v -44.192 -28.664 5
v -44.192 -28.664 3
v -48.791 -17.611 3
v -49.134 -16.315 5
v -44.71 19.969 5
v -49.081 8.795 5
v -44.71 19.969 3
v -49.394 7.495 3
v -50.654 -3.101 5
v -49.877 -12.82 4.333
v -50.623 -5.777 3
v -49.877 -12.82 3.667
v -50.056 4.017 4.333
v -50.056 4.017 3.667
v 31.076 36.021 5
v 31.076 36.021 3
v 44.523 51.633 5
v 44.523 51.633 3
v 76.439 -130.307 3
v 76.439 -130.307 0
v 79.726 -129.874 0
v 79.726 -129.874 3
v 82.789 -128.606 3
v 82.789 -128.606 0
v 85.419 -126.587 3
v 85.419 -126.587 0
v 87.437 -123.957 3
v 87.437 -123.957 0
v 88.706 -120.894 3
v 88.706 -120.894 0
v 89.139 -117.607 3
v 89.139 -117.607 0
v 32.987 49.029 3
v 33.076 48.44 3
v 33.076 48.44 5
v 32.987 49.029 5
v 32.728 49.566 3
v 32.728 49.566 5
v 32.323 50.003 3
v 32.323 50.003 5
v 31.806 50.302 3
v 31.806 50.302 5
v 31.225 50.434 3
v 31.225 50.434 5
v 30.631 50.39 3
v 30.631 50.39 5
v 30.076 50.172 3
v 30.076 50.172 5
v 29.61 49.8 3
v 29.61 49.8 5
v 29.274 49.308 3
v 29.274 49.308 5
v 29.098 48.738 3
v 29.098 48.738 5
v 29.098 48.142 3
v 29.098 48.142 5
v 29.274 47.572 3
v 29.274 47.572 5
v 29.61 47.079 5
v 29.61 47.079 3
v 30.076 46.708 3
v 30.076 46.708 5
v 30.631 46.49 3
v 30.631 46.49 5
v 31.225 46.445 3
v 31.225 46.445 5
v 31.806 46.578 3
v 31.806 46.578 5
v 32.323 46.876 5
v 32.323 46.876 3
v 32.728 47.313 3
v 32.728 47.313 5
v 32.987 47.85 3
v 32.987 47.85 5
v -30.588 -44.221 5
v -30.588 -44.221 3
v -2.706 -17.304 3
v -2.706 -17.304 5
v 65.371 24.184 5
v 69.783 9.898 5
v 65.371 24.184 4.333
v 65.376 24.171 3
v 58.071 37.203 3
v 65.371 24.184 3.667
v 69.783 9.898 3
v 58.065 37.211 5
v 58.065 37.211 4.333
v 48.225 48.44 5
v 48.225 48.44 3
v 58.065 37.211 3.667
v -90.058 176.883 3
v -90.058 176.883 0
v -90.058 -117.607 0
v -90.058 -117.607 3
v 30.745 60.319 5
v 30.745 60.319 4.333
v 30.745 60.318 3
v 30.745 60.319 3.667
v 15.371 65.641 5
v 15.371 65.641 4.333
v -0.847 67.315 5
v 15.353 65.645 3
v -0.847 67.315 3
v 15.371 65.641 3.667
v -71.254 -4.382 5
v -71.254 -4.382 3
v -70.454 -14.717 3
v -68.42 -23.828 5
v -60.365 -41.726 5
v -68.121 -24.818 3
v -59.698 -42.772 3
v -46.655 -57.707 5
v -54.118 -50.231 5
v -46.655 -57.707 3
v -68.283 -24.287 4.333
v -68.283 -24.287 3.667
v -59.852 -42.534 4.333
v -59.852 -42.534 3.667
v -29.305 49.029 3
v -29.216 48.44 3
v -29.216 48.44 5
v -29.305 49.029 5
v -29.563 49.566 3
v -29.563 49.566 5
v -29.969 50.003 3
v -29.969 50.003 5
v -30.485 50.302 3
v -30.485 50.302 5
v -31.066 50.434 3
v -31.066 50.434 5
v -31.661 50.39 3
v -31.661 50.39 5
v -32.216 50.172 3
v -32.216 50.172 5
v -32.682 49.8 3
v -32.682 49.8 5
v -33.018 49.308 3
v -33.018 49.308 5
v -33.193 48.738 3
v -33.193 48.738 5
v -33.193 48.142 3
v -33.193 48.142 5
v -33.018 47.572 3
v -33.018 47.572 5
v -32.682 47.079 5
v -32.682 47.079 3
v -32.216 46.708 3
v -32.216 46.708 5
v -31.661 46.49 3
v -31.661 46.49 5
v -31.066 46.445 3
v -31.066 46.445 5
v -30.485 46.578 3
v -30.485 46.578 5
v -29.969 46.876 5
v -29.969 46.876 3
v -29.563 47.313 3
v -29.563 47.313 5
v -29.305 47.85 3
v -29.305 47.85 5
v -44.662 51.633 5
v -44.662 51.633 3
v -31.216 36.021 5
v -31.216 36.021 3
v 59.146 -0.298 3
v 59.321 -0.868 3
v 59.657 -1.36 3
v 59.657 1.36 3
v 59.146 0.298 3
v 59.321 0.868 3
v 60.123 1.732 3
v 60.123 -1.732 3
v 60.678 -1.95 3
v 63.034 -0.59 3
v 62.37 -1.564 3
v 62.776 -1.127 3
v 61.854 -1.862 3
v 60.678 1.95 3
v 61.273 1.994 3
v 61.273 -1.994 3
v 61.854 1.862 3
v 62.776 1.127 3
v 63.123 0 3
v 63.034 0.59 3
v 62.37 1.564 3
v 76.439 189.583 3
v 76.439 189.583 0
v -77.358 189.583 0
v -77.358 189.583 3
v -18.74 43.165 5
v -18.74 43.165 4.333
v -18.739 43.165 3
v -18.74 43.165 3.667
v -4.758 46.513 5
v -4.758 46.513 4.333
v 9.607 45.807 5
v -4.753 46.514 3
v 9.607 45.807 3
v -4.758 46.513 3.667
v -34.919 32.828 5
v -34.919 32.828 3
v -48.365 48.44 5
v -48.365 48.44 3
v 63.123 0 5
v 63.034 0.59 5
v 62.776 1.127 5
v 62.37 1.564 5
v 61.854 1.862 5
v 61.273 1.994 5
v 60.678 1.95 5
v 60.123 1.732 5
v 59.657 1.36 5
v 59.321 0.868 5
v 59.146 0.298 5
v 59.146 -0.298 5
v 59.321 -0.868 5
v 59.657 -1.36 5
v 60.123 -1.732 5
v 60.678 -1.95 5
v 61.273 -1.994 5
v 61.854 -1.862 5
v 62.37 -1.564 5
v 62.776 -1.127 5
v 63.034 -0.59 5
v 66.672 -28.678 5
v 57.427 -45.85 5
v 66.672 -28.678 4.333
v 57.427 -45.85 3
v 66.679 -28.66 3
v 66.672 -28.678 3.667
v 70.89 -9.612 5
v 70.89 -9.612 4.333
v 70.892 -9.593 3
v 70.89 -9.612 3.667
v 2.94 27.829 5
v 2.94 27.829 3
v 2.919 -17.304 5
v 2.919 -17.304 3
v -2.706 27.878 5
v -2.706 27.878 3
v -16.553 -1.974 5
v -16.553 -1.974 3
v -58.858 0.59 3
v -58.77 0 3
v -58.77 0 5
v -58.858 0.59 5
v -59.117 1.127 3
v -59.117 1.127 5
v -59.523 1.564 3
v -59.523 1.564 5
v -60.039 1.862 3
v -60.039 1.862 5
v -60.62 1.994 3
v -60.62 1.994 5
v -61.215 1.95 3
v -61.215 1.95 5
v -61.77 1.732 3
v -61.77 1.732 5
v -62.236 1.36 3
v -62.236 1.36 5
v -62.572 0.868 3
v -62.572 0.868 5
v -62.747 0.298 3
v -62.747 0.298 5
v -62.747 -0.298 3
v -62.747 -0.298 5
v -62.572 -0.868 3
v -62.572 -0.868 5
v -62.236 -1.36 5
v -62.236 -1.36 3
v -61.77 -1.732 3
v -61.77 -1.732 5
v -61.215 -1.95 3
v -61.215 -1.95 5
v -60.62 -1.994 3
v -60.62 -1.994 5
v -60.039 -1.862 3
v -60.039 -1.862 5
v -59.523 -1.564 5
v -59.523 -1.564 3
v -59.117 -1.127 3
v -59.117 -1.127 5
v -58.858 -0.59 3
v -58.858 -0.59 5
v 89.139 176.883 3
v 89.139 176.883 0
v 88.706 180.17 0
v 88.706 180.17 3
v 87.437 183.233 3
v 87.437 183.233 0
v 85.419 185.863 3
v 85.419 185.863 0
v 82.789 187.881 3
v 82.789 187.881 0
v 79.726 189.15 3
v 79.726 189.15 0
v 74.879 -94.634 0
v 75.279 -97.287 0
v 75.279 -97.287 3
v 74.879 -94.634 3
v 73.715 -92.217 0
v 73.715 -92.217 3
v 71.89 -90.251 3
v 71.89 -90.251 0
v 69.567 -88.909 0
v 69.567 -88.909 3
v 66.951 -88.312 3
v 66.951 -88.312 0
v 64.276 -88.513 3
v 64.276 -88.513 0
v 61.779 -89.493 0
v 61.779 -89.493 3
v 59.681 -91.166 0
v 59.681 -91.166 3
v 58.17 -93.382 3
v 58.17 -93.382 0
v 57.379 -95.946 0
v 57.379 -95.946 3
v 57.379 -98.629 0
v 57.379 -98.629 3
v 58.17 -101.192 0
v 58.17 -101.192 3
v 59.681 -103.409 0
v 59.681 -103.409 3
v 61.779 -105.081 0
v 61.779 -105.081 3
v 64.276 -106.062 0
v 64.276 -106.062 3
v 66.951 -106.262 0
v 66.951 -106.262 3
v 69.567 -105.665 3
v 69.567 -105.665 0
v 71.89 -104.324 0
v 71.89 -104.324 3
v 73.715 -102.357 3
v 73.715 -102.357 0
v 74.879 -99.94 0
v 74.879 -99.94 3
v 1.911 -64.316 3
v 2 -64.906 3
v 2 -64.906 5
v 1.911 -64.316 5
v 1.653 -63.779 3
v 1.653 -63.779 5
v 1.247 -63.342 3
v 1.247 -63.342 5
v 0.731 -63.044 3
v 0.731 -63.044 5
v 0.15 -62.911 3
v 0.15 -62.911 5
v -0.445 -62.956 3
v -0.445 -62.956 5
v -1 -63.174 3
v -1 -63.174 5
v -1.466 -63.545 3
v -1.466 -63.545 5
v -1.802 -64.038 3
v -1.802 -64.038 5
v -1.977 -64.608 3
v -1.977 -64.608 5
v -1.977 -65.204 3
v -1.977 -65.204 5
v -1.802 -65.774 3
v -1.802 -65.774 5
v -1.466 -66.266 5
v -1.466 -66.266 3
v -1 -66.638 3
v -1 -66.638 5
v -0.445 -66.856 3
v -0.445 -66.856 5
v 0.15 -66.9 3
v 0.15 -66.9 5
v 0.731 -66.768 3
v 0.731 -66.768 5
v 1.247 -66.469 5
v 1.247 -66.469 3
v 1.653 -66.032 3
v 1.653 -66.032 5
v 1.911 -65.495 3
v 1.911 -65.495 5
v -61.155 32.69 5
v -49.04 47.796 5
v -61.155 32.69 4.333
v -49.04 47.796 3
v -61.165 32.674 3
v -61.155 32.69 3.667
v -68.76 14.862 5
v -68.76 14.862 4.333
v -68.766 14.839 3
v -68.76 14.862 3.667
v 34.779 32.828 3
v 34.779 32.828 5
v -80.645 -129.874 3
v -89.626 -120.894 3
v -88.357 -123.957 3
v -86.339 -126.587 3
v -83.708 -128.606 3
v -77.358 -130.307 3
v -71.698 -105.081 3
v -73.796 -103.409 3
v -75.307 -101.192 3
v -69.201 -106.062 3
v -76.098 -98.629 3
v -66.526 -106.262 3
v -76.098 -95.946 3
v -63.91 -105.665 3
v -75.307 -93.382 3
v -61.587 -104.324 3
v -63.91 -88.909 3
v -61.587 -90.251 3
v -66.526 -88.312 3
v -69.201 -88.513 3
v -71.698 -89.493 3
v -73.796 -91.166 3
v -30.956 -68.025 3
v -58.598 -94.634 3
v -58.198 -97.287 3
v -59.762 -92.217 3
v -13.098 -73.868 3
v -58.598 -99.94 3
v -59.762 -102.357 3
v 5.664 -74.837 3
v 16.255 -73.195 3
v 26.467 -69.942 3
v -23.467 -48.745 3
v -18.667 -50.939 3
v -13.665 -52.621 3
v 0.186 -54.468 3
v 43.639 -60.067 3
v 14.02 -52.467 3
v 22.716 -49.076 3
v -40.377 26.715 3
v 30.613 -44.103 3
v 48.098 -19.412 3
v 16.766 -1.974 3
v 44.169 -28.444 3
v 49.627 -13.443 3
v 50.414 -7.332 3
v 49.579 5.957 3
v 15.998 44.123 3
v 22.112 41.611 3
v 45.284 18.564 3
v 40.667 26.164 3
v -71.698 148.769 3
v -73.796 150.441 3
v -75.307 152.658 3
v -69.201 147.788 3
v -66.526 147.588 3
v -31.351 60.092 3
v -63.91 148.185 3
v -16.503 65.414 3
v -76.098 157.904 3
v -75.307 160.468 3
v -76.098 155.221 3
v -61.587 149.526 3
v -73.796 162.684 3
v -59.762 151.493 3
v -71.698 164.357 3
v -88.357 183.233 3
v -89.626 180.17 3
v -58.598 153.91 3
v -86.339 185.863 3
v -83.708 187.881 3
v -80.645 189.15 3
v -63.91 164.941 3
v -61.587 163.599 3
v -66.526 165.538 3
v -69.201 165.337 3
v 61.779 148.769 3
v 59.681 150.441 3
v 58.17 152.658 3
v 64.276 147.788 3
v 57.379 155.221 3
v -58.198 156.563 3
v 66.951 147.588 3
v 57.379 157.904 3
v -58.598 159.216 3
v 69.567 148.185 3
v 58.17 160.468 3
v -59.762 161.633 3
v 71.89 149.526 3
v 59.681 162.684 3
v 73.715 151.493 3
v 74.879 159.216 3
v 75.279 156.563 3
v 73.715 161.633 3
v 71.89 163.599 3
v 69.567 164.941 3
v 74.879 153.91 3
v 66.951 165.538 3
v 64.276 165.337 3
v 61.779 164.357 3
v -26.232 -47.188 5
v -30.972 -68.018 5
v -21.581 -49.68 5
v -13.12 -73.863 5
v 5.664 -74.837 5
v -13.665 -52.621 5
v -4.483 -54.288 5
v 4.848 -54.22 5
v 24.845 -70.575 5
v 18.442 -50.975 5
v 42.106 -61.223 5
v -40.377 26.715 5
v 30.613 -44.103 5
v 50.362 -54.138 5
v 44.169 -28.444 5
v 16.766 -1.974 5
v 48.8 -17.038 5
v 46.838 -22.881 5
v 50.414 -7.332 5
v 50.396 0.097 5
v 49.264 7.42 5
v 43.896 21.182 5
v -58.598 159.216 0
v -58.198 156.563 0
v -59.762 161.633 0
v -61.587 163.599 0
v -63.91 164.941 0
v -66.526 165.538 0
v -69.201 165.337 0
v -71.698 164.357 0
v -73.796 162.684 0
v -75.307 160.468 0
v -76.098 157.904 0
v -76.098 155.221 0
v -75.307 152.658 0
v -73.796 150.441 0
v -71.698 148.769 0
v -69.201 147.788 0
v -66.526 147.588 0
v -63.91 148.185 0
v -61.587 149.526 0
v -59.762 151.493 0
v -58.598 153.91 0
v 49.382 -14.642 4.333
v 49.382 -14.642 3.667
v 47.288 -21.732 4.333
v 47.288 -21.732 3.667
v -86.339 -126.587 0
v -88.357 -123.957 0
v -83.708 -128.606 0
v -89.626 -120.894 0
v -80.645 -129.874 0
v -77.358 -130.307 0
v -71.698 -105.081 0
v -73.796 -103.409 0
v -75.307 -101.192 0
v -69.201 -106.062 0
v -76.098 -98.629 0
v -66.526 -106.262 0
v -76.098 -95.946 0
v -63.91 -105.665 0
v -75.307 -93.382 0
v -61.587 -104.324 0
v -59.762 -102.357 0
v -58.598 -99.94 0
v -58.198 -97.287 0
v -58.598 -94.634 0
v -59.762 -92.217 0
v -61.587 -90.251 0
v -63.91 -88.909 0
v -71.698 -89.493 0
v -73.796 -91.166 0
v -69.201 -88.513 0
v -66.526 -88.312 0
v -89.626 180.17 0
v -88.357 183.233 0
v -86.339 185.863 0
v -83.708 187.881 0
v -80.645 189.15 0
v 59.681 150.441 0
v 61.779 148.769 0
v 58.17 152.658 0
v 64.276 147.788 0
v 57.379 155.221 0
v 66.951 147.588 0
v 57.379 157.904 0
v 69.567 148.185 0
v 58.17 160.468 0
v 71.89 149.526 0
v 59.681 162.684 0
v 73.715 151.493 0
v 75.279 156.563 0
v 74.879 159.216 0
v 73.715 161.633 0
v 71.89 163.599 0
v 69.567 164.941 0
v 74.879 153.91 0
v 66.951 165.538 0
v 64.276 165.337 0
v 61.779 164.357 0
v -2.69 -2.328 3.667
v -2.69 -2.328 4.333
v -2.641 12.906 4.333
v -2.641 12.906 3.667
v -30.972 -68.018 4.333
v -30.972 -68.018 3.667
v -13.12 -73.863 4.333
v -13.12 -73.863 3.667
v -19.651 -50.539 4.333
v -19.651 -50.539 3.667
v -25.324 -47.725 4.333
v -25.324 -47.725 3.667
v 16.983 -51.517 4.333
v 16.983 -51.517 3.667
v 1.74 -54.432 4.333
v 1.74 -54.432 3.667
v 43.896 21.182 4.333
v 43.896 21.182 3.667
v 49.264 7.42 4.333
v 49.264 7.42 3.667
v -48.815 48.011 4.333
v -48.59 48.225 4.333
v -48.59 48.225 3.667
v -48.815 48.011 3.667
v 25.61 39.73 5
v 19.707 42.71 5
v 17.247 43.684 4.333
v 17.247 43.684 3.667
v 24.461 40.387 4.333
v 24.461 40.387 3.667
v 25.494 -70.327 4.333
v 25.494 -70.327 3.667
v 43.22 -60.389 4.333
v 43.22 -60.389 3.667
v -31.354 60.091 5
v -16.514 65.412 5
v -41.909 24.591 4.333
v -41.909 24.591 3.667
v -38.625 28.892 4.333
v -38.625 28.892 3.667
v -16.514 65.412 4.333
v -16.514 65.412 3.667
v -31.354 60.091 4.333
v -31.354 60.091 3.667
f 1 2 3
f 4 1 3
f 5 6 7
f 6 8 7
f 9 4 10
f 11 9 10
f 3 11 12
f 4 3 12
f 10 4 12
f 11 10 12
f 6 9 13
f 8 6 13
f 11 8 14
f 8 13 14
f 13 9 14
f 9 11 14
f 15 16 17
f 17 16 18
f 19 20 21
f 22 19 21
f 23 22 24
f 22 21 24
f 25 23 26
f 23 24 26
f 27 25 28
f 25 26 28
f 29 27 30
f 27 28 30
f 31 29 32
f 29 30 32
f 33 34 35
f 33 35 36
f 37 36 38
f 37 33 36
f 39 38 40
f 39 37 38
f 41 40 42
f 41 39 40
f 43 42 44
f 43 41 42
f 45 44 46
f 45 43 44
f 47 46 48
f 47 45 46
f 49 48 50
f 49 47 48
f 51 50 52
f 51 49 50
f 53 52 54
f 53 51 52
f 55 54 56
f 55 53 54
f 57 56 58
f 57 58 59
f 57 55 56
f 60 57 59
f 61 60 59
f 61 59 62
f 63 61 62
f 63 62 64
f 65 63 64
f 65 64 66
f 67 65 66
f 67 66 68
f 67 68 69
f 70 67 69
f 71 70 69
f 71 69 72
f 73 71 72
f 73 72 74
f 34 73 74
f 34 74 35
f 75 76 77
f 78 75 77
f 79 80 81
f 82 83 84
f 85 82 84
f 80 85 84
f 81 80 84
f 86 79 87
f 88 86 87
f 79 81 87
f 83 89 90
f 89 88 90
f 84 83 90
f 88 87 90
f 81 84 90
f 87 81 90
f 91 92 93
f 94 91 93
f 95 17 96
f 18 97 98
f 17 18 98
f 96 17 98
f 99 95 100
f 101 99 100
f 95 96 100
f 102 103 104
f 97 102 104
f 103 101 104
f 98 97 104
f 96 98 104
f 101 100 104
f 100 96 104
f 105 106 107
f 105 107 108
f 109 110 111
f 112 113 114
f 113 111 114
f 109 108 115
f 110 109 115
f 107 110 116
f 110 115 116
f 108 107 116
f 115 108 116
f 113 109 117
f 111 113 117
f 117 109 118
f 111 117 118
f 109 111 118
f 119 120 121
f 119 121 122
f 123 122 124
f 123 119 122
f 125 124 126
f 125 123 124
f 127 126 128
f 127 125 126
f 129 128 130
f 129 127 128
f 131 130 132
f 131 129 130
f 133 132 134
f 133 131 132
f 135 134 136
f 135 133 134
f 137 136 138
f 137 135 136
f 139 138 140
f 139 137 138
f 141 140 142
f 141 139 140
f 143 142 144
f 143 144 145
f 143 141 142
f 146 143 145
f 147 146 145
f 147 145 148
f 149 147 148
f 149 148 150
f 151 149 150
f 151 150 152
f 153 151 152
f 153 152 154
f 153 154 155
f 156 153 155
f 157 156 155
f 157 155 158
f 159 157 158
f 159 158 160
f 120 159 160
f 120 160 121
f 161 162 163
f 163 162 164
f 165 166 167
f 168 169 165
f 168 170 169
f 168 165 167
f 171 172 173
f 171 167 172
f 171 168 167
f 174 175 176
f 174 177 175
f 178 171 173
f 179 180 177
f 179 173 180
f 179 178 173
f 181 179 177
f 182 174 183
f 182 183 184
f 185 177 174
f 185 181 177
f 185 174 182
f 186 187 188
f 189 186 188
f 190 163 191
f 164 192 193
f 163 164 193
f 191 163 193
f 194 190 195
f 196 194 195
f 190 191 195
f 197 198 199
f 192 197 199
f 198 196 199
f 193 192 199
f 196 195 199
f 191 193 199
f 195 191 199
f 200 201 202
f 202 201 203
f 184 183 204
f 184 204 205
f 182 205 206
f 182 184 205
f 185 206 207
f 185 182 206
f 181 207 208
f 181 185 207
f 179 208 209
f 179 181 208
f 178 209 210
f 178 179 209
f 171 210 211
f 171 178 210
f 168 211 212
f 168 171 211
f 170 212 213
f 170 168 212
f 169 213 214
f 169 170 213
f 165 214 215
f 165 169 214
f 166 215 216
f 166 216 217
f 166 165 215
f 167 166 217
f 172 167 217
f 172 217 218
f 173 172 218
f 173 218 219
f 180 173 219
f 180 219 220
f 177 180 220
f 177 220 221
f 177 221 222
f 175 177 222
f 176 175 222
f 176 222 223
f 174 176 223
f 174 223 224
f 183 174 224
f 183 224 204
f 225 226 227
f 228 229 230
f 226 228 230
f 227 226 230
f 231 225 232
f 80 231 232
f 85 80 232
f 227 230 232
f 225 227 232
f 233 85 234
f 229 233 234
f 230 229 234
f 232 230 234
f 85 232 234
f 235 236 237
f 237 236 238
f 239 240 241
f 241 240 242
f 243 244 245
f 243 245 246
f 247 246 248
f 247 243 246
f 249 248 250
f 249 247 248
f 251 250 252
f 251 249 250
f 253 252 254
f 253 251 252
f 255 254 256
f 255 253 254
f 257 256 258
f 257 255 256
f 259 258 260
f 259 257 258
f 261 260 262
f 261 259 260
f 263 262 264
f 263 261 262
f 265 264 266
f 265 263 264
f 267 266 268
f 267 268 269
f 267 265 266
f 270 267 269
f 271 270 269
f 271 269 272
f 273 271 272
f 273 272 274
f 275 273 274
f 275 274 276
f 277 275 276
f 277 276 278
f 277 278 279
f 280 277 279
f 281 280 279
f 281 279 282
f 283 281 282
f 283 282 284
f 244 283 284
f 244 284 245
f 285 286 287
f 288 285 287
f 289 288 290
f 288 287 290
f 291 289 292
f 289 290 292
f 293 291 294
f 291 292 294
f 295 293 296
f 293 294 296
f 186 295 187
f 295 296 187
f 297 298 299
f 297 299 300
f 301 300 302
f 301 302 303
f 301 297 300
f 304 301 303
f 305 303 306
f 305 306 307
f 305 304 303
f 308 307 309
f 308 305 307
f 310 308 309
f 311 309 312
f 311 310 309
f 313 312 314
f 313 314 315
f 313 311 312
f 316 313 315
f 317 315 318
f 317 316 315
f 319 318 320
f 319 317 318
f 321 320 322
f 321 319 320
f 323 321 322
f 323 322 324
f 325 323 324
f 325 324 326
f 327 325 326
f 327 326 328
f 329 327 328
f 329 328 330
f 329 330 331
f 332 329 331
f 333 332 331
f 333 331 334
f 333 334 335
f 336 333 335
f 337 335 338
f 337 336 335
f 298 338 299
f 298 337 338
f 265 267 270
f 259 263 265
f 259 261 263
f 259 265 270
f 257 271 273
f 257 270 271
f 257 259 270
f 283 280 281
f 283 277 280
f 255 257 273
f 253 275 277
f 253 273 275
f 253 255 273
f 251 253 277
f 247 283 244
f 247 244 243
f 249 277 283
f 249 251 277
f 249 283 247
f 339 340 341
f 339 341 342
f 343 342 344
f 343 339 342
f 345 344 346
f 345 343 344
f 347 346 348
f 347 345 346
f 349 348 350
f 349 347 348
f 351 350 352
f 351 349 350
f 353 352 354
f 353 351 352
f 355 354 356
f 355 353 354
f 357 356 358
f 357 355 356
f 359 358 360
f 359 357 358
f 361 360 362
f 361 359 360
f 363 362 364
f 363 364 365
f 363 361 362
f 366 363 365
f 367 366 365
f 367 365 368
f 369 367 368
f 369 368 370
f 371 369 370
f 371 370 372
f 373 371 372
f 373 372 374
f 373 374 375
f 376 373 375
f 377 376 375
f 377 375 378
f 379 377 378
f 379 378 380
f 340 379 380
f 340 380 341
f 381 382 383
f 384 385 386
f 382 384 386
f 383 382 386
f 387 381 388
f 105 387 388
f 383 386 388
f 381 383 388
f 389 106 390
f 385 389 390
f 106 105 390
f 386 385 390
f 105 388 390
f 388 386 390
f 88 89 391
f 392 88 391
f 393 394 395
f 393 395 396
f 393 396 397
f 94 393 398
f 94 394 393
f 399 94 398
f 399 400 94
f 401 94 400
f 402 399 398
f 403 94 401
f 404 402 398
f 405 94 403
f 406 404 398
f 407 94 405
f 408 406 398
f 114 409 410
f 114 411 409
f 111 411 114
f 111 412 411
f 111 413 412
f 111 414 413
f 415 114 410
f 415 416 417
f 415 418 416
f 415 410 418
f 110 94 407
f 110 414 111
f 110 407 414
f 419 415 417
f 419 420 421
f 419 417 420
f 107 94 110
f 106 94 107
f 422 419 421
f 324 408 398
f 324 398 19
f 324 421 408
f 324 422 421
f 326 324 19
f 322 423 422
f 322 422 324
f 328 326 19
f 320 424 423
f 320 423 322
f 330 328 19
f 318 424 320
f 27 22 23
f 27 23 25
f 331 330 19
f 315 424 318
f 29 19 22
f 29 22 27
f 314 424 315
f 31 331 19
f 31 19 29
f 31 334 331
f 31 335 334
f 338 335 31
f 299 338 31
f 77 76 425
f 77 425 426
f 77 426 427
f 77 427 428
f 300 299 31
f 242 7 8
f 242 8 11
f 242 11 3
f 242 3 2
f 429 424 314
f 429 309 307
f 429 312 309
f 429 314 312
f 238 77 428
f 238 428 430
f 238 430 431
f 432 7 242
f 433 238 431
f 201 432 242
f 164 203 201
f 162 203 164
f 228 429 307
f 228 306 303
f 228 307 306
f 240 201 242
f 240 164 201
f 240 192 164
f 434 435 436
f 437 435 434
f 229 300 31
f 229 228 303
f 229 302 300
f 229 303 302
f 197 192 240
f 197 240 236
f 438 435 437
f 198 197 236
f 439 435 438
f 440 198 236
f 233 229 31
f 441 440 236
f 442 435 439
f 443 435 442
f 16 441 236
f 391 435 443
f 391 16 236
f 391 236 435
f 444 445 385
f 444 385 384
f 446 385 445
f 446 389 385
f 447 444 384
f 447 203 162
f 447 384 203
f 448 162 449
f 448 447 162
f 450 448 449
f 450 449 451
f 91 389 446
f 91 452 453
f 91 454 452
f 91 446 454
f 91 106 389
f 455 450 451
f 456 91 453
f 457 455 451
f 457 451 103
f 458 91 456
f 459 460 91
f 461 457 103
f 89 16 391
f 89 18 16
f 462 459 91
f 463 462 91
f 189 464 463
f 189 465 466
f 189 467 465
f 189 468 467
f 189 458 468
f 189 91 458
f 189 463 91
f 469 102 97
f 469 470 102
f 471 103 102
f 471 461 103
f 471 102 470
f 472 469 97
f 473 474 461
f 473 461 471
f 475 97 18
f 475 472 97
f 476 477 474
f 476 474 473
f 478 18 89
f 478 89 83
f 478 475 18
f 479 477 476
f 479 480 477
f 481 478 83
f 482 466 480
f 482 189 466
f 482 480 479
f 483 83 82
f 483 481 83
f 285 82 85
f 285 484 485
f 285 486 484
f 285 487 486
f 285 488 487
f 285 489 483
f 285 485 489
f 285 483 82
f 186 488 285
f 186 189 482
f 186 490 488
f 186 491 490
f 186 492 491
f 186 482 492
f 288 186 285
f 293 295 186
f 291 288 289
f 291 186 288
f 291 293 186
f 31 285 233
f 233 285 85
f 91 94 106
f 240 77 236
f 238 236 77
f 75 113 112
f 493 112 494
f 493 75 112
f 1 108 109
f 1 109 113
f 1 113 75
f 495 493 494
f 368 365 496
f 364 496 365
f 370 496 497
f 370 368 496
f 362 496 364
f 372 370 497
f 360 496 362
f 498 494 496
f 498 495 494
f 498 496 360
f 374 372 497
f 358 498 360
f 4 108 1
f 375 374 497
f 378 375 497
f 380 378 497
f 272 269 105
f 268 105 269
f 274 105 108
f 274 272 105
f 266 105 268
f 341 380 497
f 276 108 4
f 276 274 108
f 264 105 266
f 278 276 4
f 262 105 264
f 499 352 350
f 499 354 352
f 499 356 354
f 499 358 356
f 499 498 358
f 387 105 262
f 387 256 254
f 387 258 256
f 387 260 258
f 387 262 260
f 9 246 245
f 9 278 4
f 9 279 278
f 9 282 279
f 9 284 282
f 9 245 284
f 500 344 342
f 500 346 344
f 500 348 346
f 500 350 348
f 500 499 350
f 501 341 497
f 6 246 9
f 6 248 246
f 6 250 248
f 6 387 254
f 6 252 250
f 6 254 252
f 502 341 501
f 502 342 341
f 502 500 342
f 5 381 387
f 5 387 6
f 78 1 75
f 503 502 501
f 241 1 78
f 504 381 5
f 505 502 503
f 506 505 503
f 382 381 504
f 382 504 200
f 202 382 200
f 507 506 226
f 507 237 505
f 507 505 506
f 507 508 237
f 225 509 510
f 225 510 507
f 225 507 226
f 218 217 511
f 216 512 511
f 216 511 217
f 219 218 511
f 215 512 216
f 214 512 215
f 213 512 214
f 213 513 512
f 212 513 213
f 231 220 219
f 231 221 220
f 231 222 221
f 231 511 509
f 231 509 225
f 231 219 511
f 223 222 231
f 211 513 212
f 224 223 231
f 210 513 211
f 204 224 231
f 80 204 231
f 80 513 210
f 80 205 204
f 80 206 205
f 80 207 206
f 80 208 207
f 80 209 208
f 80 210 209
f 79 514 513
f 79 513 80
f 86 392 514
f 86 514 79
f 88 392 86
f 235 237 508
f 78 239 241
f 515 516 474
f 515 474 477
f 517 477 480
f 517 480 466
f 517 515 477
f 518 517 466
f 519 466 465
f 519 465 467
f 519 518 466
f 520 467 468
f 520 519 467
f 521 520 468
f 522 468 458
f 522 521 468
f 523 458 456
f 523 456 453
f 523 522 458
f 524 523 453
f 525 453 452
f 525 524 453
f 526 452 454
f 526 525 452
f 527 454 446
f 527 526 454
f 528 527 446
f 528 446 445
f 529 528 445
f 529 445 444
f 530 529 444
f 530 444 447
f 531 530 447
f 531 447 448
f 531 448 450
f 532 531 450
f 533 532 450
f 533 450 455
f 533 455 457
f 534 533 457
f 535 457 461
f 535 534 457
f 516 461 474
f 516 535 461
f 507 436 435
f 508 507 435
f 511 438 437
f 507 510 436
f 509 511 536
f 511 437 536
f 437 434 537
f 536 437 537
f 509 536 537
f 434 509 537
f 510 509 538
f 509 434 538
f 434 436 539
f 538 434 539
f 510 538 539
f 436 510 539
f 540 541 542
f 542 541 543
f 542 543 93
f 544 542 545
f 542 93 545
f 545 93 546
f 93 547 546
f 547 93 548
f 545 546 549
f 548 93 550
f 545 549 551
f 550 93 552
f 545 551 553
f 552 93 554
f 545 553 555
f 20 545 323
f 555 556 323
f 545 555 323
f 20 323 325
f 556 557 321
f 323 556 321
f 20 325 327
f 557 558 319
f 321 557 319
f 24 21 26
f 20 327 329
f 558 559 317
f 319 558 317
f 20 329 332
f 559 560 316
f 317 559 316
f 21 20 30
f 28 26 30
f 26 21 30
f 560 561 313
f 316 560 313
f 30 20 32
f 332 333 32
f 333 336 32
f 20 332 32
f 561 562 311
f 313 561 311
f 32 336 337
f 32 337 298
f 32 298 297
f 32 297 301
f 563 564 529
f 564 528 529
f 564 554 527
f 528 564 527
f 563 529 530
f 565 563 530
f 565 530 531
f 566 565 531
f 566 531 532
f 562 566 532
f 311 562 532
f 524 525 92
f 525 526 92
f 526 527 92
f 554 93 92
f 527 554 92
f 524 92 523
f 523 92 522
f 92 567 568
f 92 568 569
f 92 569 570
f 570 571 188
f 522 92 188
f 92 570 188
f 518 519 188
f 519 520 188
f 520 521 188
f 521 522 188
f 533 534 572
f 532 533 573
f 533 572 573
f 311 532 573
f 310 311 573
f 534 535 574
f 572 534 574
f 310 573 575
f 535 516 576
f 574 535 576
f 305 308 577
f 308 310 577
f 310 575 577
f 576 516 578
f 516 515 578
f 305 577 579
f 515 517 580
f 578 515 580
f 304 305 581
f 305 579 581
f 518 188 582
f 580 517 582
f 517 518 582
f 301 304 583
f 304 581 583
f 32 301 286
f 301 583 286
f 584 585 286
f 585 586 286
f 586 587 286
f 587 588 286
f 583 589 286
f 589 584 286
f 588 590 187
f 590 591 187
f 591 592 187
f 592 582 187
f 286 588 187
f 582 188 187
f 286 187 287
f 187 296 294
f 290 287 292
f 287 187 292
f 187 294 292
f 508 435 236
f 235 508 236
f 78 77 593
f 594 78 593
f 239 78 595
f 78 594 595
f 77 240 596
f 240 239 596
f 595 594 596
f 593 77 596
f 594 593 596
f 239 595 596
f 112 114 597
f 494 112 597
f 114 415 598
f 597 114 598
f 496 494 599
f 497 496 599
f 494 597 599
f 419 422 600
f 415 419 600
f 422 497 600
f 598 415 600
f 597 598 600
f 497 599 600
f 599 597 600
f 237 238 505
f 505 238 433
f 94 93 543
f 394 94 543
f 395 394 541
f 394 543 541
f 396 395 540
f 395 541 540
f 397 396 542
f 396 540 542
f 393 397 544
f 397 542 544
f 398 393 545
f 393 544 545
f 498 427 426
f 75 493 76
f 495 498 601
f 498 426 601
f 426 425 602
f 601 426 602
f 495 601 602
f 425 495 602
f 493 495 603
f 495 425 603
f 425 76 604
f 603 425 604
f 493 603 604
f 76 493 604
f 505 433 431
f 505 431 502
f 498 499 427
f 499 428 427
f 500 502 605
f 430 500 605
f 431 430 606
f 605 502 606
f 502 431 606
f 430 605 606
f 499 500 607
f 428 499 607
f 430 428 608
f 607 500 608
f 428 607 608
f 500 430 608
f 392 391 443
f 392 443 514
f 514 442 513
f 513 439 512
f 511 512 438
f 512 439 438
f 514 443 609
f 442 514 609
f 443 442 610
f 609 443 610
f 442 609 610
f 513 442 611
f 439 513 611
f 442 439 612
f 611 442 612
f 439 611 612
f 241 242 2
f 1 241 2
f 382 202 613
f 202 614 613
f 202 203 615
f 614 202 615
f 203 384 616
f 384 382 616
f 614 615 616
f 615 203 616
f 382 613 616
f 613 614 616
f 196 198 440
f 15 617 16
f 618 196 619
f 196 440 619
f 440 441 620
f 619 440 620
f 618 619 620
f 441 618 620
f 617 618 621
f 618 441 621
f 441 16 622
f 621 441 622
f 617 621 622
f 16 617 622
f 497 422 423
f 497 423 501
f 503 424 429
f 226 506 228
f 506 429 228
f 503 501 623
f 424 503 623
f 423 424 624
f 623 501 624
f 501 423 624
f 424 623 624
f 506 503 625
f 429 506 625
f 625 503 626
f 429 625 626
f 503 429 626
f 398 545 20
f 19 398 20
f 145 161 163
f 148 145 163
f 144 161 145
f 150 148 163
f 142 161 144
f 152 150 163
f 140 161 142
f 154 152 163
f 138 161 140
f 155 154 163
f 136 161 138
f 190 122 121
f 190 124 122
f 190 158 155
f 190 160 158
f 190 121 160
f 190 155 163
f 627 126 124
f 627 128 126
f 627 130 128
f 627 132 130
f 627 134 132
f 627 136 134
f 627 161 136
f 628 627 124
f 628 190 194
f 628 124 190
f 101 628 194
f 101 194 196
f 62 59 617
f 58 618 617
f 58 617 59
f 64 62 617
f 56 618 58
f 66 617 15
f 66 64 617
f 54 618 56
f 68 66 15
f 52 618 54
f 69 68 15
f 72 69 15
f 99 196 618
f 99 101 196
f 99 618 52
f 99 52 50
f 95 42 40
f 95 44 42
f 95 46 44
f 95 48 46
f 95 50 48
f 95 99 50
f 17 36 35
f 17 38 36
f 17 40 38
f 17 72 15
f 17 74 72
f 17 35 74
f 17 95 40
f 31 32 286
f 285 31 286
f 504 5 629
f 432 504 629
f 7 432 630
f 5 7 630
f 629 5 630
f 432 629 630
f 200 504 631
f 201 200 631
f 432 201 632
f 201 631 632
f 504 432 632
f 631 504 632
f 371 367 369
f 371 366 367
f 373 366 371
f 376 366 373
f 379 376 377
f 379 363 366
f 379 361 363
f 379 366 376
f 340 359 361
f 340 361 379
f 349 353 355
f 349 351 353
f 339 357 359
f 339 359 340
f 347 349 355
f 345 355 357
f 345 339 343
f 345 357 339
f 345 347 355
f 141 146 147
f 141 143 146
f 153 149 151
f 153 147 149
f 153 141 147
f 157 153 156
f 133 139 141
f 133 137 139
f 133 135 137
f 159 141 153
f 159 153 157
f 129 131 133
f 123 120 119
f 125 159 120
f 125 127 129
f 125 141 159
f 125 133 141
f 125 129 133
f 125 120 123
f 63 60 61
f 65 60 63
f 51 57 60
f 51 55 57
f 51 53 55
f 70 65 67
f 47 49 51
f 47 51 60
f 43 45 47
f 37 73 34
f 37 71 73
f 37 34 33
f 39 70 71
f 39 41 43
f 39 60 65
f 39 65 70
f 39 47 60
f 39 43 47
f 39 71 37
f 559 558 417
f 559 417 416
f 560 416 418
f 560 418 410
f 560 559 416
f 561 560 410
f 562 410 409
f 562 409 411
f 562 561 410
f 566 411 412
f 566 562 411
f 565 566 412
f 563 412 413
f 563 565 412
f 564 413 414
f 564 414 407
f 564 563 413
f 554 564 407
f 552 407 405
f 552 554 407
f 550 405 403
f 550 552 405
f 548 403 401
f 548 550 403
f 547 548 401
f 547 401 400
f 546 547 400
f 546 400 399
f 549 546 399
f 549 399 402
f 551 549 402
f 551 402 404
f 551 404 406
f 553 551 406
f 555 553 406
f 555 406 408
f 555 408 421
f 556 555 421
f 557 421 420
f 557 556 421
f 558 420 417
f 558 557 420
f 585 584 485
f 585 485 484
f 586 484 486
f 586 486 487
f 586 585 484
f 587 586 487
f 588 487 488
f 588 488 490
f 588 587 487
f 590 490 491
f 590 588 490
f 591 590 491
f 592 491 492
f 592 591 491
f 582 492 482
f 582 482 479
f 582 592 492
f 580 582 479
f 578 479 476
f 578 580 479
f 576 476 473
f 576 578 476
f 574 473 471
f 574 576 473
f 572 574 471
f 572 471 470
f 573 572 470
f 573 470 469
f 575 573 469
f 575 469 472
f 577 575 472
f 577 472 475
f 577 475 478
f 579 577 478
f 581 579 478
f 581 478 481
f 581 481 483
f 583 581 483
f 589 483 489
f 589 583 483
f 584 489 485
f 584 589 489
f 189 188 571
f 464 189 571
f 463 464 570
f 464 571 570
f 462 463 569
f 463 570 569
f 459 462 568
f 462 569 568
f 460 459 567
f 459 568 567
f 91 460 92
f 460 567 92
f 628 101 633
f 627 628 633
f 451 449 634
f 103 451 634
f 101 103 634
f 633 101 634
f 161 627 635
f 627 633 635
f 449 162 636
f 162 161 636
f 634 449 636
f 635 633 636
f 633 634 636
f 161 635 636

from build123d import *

# Parameters (mm, degrees)
F1_R     = 9
F2_DEPTH = 3
F0_R     = 2
F3_DEPTH = 5
F4_DEPTH = 5


with BuildPart() as f2:
    # F1 (on Top) → F2 (new body)
    with BuildSketch(Plane.XY):
        with BuildLine():
            ThreePointArc((76.4386732788, -130.3071677685), (85.4189293999, -126.5874238895), (89.1386732788, -117.6071677685))
            Line((89.1386732788, -117.6071677685), (89.1386732788, 176.8828322315))
            ThreePointArc((89.1386732788, 176.8828322315), (85.4189293999, 185.8630883526), (76.4386732788, 189.5828322315))
            Line((76.4386732788, 189.5828322315), (-77.3583267212, 189.5828322315))
            ThreePointArc((-77.3583267212, 189.5828322315), (-86.3385828423, 185.8630883526), (-90.0583267212, 176.8828322315))
            Line((-90.0583267212, 176.8828322315), (-90.0583267212, -117.6071677685))
            ThreePointArc((-90.0583267212, -117.6071677685), (-86.3385828423, -126.5874238895), (-77.3583267212, -130.3071677685))
            Line((-77.3583267212, -130.3071677685), (76.4386732788, -130.3071677685))
        make_face()
        with Locations((-67.1983267212, -97.2871677685)):
            Circle(F1_R, mode=Mode.SUBTRACT)
        with Locations((66.2786732788, -97.2871677685)):
            Circle(F1_R, mode=Mode.SUBTRACT)
        with Locations((-67.1983267212, 156.5628322315)):
            Circle(F1_R, mode=Mode.SUBTRACT)
        with Locations((66.2786732788, 156.5628322315)):
            Circle(F1_R, mode=Mode.SUBTRACT)
    extrude(amount=F2_DEPTH)

    # F0 (on Top) → F3 (join)
    with BuildSketch(Plane.XY):
        with BuildLine():
            add(Edge.make_bspline(
                [(44.5225109401, 51.6328074749), (31.7931699117, 61.9046377655), (15.5430863667, 67.5611001635), (-0.8466675809, 67.3154957518)],
                knots=[0, 0, 0, 0, 1, 1, 1, 1], degree=3))
            add(Edge.make_bspline(
                [(-0.8466675809, 67.3154957518), (-16.6914552758, 67.2139309121), (-32.3557233009, 61.5656679848), (-44.6624829203, 51.6328074749)],
                knots=[0, 0, 0, 0, 1, 1, 1, 1], degree=3))
            Line((-44.6624829203, 51.6328074749), (-31.2156959628, 36.0207258387))
            add(Edge.make_bspline(
                [(-31.2156959628, 36.0207258387), (-19.8668770846, 44.9768453315), (-4.5754724959, 48.626535939), (9.607211652, 45.8069907111)],
                knots=[0, 0, 0, 0, 1, 1, 1, 1], degree=3))
            add(Edge.make_bspline(
                [(9.607211652, 45.8069907111), (17.4015278884, 44.3075346269), (24.8181773865, 40.8851063357), (31.0757239826, 36.0207258387)],
                knots=[0, 0, 0, 0, 1, 1, 1, 1], degree=3))
            Line((31.0757239826, 36.0207258387), (44.5225109401, 51.6328074749))
        make_face()
        with Locations((-31.2156959628, 48.4397840007)):
            Circle(F0_R, mode=Mode.SUBTRACT)
        with Locations((31.0757239826, 48.4397840007)):
            Circle(F0_R, mode=Mode.SUBTRACT)
    extrude(amount=F3_DEPTH)

    # F0 (on Top) → F4 (join)
    with BuildSketch(Plane.XY):
        with BuildLine():
            add(Edge.make_bspline(
                [(-48.3654487285, 48.4397840007), (-48.5903470483, 48.2253463108), (-48.8152456845, 48.0109111522), (-49.0401417893, 47.7964712472)],
                knots=[0, 0, 0, 0, 1, 1, 1, 1], degree=3))
            add(Edge.make_bspline(
                [(-49.0401417893, 47.7964712472), (-63.2089023734, 34.4854490825), (-71.5164935114, 15.1358143832), (-71.2536124009, -4.3823817258)],
                knots=[0, 0, 0, 0, 1, 1, 1, 1], degree=3))
            add(Edge.make_bspline(
                [(-71.2536124009, -4.3823817258), (-71.2452113687, -24.6424367519), (-62.0032950914, -44.5436607549), (-46.6551817954, -57.7066801488)],
                knots=[0, 0, 0, 0, 1, 1, 1, 1], degree=3))
            add(Edge.make_bspline(
                [(-46.6551817954, -57.7066801488), (-32.4680977849, -70.1146960954), (-13.1730887798, -76.4354807885), (5.6641111211, -74.8365011098)],
                knots=[0, 0, 0, 0, 1, 1, 1, 1], degree=3))
            add(Edge.make_bspline(
                [(5.6641111211, -74.8365011098), (26.0758546138, -73.3164411383), (45.4498377508, -62.4142271403), (57.4270848419, -45.8498931001)],
                knots=[0, 0, 0, 0, 1, 1, 1, 1], degree=3))
            add(Edge.make_bspline(
                [(57.4270848419, -45.8498931001), (69.0851876389, -30.1089858288), (73.6526652184, -9.3511818312), (69.782774857, 9.8980318978)],
                knots=[0, 0, 0, 0, 1, 1, 1, 1], degree=3))
            add(Edge.make_bspline(
                [(69.782774857, 9.8980318978), (66.9379075577, 24.63337834), (59.2125294632, 38.289509842), (48.2254770647, 48.4397840007)],
                knots=[0, 0, 0, 0, 1, 1, 1, 1], degree=3))
            Line((48.2254770647, 48.4397840007), (34.7786901072, 32.8277023646))
            add(Edge.make_bspline(
                [(34.7786901072, 32.8277023646), (45.6135961749, 22.6148903531), (51.529750139, 7.5398526857), (50.4143066574, -7.3322188933)],
                knots=[0, 0, 0, 0, 1, 1, 1, 1], degree=3))
            add(Edge.make_bspline(
                [(50.4143066574, -7.3322188933), (49.9263728127, -14.7005793852), (47.7863498942, -21.9724011014), (44.1694752054, -28.4438325965)],
                knots=[0, 0, 0, 0, 1, 1, 1, 1], degree=3))
            Line((44.1694752054, -28.4438325965), (16.765956425, -1.9739032718))
            Line((16.765956425, -1.9739032718), (2.9398510008, 27.8290335048))
            Line((2.9398510008, 27.8290335048), (2.919062006, -17.3035535989))
            Line((2.919062006, -17.3035535989), (30.6128555902, -44.1029862757))
            add(Edge.make_bspline(
                [(30.6128555902, -44.1029862757), (18.2719055103, -53.691098487), (1.3390673943, -56.8712473399), (-13.6652661742, -52.6212601112)],
                knots=[0, 0, 0, 0, 1, 1, 1, 1], degree=3))
            add(Edge.make_bspline(
                [(-13.6652661742, -52.6212601112), (-19.7747362729, -50.9170276822), (-25.5600477213, -48.0575679008), (-30.5880749451, -44.220664643)],
                knots=[0, 0, 0, 0, 1, 1, 1, 1], degree=3))
            Line((-30.5880749451, -44.220664643), (-2.7059963529, -17.3035535989))
            add(Edge.make_bspline(
                [(-2.7059963529, -17.3035535989), (-2.7546011493, -2.6300403353), (-2.535721196, 13.2099469053), (-2.7061599436, 27.8775294516)],
                knots=[0, 0, 0, 0, 1, 1, 1, 1], degree=3))
            Line((-2.7061599436, 27.8775294516), (-16.5528929868, -1.9739029554))
            Line((-16.5528929868, -1.9739029554), (-44.1917691347, -28.6635004431))
            add(Edge.make_bspline(
                [(-44.1917691347, -28.6635004431), (-52.6237632628, -13.9439238932), (-52.8254617605, 5.0855102919), (-44.7095549634, 19.9693104078)],
                knots=[0, 0, 0, 0, 1, 1, 1, 1], degree=3))
            add(Edge.make_bspline(
                [(-44.7095549634, 19.9693104078), (-42.1723888347, 24.7374657043), (-38.8143418771, 29.0889415146), (-34.9186624038, 32.8277023646)],
                knots=[0, 0, 0, 0, 1, 1, 1, 1], degree=3))
            Line((-34.9186624038, 32.8277023646), (-48.3654487285, 48.4397840007))
        make_face()
        with Locations((0.0002132058, -64.9058073759)):
            Circle(F0_R, mode=Mode.SUBTRACT)
        with Locations((-60.7696250081, 0)):
            Circle(F0_R, mode=Mode.SUBTRACT)
        with Locations((61.1233077943, 0)):
            Circle(F0_R, mode=Mode.SUBTRACT)
    extrude(amount=F4_DEPTH)


solid = f2.part
